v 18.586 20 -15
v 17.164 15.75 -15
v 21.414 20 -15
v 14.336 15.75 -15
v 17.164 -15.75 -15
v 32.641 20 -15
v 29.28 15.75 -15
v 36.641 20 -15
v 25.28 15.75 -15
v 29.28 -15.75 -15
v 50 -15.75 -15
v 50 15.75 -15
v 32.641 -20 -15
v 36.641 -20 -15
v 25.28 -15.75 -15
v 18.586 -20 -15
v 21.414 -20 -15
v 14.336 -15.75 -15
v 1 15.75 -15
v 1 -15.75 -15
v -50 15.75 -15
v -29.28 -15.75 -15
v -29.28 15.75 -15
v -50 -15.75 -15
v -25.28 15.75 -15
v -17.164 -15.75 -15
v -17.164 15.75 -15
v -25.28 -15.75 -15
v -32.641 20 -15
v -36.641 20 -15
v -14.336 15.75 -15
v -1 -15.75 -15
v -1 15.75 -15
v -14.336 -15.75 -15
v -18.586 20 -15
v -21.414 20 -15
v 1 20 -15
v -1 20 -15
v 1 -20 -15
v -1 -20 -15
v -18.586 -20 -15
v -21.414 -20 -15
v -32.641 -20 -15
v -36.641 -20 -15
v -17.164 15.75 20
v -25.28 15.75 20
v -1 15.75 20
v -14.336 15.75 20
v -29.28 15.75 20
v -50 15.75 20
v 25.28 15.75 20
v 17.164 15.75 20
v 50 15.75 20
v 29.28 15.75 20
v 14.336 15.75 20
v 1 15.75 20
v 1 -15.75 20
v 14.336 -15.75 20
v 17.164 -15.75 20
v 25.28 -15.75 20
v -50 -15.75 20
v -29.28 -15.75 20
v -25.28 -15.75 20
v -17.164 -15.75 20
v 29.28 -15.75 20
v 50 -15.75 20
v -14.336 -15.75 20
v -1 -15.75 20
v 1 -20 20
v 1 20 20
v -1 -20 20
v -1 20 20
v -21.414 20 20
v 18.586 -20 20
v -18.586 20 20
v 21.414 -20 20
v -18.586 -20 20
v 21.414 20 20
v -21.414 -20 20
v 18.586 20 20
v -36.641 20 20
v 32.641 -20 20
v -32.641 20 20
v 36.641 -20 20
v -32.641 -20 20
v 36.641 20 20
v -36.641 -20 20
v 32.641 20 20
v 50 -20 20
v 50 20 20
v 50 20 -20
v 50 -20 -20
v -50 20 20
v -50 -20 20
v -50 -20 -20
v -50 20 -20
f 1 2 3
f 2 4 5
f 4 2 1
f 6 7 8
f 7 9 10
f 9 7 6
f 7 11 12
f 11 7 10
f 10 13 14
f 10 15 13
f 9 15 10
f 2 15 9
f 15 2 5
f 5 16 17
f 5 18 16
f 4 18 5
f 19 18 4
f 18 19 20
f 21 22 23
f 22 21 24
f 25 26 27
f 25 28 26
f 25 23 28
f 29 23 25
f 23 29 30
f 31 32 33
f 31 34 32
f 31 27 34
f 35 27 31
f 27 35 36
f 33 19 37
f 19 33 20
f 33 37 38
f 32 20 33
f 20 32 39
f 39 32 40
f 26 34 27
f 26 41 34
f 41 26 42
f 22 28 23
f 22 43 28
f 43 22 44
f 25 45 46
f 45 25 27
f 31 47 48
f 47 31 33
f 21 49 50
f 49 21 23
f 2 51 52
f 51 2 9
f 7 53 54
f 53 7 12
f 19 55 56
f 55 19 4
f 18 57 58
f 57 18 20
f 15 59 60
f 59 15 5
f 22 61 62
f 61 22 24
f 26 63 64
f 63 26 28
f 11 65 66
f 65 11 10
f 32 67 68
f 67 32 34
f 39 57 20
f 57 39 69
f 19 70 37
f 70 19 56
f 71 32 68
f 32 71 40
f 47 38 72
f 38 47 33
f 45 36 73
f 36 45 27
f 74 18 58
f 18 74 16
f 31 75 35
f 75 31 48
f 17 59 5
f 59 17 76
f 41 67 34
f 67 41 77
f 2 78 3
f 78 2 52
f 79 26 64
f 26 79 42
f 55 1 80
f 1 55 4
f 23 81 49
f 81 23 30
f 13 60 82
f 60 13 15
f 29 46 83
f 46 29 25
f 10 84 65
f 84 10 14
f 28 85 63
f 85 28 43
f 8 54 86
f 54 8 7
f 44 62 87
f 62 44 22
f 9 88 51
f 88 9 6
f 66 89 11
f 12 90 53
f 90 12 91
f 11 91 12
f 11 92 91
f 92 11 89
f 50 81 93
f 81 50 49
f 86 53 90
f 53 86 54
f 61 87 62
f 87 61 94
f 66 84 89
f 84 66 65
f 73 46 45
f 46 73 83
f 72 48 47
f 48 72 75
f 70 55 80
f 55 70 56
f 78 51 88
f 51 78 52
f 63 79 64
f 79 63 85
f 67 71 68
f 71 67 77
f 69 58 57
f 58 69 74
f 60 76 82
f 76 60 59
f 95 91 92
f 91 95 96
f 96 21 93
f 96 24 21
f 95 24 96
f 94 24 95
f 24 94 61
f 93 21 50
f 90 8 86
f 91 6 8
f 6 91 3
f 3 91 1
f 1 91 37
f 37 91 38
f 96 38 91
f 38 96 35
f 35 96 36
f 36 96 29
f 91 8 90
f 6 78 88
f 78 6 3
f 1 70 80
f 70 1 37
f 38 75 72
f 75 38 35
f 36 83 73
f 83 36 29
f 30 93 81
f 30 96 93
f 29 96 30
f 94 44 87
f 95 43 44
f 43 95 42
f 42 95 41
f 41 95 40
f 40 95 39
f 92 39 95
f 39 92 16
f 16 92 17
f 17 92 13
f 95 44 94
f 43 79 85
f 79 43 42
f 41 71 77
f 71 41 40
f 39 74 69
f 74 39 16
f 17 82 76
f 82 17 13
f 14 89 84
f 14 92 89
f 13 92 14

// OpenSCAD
// [FL_INDEX: keywords="openscad, 3d_parametric, Parametric_Miter_Box, csg_solid" | COT="Parametric OpenSCAD design from 3DCodeverse"]
// Title: Parametric Miter Box

x=100;
y=30;
z=30;
cut=2;
module miter(){
difference(){
cube([x,y+10,z+10],true);
union(){
translate([0,0,5])cube([x+12,y+1.5,z+10],true);
translate([0,0,5])cube([cut,y*2,z+10],true); //90
rotate([0,0,45])translate([0,0,5])cube([cut,y*3,z+10],true); //45
rotate([0,0,-45])translate([0,0,5])cube([cut,y*3,z+10],true); //-45
rotate([0,0,60])translate([0,0,5])cube([cut,y*3,z+10],true); //60
rotate([0,0,-60])translate([0,0,5])cube([cut,y*3,z+10],true); //-60
}
}
}


miter();
